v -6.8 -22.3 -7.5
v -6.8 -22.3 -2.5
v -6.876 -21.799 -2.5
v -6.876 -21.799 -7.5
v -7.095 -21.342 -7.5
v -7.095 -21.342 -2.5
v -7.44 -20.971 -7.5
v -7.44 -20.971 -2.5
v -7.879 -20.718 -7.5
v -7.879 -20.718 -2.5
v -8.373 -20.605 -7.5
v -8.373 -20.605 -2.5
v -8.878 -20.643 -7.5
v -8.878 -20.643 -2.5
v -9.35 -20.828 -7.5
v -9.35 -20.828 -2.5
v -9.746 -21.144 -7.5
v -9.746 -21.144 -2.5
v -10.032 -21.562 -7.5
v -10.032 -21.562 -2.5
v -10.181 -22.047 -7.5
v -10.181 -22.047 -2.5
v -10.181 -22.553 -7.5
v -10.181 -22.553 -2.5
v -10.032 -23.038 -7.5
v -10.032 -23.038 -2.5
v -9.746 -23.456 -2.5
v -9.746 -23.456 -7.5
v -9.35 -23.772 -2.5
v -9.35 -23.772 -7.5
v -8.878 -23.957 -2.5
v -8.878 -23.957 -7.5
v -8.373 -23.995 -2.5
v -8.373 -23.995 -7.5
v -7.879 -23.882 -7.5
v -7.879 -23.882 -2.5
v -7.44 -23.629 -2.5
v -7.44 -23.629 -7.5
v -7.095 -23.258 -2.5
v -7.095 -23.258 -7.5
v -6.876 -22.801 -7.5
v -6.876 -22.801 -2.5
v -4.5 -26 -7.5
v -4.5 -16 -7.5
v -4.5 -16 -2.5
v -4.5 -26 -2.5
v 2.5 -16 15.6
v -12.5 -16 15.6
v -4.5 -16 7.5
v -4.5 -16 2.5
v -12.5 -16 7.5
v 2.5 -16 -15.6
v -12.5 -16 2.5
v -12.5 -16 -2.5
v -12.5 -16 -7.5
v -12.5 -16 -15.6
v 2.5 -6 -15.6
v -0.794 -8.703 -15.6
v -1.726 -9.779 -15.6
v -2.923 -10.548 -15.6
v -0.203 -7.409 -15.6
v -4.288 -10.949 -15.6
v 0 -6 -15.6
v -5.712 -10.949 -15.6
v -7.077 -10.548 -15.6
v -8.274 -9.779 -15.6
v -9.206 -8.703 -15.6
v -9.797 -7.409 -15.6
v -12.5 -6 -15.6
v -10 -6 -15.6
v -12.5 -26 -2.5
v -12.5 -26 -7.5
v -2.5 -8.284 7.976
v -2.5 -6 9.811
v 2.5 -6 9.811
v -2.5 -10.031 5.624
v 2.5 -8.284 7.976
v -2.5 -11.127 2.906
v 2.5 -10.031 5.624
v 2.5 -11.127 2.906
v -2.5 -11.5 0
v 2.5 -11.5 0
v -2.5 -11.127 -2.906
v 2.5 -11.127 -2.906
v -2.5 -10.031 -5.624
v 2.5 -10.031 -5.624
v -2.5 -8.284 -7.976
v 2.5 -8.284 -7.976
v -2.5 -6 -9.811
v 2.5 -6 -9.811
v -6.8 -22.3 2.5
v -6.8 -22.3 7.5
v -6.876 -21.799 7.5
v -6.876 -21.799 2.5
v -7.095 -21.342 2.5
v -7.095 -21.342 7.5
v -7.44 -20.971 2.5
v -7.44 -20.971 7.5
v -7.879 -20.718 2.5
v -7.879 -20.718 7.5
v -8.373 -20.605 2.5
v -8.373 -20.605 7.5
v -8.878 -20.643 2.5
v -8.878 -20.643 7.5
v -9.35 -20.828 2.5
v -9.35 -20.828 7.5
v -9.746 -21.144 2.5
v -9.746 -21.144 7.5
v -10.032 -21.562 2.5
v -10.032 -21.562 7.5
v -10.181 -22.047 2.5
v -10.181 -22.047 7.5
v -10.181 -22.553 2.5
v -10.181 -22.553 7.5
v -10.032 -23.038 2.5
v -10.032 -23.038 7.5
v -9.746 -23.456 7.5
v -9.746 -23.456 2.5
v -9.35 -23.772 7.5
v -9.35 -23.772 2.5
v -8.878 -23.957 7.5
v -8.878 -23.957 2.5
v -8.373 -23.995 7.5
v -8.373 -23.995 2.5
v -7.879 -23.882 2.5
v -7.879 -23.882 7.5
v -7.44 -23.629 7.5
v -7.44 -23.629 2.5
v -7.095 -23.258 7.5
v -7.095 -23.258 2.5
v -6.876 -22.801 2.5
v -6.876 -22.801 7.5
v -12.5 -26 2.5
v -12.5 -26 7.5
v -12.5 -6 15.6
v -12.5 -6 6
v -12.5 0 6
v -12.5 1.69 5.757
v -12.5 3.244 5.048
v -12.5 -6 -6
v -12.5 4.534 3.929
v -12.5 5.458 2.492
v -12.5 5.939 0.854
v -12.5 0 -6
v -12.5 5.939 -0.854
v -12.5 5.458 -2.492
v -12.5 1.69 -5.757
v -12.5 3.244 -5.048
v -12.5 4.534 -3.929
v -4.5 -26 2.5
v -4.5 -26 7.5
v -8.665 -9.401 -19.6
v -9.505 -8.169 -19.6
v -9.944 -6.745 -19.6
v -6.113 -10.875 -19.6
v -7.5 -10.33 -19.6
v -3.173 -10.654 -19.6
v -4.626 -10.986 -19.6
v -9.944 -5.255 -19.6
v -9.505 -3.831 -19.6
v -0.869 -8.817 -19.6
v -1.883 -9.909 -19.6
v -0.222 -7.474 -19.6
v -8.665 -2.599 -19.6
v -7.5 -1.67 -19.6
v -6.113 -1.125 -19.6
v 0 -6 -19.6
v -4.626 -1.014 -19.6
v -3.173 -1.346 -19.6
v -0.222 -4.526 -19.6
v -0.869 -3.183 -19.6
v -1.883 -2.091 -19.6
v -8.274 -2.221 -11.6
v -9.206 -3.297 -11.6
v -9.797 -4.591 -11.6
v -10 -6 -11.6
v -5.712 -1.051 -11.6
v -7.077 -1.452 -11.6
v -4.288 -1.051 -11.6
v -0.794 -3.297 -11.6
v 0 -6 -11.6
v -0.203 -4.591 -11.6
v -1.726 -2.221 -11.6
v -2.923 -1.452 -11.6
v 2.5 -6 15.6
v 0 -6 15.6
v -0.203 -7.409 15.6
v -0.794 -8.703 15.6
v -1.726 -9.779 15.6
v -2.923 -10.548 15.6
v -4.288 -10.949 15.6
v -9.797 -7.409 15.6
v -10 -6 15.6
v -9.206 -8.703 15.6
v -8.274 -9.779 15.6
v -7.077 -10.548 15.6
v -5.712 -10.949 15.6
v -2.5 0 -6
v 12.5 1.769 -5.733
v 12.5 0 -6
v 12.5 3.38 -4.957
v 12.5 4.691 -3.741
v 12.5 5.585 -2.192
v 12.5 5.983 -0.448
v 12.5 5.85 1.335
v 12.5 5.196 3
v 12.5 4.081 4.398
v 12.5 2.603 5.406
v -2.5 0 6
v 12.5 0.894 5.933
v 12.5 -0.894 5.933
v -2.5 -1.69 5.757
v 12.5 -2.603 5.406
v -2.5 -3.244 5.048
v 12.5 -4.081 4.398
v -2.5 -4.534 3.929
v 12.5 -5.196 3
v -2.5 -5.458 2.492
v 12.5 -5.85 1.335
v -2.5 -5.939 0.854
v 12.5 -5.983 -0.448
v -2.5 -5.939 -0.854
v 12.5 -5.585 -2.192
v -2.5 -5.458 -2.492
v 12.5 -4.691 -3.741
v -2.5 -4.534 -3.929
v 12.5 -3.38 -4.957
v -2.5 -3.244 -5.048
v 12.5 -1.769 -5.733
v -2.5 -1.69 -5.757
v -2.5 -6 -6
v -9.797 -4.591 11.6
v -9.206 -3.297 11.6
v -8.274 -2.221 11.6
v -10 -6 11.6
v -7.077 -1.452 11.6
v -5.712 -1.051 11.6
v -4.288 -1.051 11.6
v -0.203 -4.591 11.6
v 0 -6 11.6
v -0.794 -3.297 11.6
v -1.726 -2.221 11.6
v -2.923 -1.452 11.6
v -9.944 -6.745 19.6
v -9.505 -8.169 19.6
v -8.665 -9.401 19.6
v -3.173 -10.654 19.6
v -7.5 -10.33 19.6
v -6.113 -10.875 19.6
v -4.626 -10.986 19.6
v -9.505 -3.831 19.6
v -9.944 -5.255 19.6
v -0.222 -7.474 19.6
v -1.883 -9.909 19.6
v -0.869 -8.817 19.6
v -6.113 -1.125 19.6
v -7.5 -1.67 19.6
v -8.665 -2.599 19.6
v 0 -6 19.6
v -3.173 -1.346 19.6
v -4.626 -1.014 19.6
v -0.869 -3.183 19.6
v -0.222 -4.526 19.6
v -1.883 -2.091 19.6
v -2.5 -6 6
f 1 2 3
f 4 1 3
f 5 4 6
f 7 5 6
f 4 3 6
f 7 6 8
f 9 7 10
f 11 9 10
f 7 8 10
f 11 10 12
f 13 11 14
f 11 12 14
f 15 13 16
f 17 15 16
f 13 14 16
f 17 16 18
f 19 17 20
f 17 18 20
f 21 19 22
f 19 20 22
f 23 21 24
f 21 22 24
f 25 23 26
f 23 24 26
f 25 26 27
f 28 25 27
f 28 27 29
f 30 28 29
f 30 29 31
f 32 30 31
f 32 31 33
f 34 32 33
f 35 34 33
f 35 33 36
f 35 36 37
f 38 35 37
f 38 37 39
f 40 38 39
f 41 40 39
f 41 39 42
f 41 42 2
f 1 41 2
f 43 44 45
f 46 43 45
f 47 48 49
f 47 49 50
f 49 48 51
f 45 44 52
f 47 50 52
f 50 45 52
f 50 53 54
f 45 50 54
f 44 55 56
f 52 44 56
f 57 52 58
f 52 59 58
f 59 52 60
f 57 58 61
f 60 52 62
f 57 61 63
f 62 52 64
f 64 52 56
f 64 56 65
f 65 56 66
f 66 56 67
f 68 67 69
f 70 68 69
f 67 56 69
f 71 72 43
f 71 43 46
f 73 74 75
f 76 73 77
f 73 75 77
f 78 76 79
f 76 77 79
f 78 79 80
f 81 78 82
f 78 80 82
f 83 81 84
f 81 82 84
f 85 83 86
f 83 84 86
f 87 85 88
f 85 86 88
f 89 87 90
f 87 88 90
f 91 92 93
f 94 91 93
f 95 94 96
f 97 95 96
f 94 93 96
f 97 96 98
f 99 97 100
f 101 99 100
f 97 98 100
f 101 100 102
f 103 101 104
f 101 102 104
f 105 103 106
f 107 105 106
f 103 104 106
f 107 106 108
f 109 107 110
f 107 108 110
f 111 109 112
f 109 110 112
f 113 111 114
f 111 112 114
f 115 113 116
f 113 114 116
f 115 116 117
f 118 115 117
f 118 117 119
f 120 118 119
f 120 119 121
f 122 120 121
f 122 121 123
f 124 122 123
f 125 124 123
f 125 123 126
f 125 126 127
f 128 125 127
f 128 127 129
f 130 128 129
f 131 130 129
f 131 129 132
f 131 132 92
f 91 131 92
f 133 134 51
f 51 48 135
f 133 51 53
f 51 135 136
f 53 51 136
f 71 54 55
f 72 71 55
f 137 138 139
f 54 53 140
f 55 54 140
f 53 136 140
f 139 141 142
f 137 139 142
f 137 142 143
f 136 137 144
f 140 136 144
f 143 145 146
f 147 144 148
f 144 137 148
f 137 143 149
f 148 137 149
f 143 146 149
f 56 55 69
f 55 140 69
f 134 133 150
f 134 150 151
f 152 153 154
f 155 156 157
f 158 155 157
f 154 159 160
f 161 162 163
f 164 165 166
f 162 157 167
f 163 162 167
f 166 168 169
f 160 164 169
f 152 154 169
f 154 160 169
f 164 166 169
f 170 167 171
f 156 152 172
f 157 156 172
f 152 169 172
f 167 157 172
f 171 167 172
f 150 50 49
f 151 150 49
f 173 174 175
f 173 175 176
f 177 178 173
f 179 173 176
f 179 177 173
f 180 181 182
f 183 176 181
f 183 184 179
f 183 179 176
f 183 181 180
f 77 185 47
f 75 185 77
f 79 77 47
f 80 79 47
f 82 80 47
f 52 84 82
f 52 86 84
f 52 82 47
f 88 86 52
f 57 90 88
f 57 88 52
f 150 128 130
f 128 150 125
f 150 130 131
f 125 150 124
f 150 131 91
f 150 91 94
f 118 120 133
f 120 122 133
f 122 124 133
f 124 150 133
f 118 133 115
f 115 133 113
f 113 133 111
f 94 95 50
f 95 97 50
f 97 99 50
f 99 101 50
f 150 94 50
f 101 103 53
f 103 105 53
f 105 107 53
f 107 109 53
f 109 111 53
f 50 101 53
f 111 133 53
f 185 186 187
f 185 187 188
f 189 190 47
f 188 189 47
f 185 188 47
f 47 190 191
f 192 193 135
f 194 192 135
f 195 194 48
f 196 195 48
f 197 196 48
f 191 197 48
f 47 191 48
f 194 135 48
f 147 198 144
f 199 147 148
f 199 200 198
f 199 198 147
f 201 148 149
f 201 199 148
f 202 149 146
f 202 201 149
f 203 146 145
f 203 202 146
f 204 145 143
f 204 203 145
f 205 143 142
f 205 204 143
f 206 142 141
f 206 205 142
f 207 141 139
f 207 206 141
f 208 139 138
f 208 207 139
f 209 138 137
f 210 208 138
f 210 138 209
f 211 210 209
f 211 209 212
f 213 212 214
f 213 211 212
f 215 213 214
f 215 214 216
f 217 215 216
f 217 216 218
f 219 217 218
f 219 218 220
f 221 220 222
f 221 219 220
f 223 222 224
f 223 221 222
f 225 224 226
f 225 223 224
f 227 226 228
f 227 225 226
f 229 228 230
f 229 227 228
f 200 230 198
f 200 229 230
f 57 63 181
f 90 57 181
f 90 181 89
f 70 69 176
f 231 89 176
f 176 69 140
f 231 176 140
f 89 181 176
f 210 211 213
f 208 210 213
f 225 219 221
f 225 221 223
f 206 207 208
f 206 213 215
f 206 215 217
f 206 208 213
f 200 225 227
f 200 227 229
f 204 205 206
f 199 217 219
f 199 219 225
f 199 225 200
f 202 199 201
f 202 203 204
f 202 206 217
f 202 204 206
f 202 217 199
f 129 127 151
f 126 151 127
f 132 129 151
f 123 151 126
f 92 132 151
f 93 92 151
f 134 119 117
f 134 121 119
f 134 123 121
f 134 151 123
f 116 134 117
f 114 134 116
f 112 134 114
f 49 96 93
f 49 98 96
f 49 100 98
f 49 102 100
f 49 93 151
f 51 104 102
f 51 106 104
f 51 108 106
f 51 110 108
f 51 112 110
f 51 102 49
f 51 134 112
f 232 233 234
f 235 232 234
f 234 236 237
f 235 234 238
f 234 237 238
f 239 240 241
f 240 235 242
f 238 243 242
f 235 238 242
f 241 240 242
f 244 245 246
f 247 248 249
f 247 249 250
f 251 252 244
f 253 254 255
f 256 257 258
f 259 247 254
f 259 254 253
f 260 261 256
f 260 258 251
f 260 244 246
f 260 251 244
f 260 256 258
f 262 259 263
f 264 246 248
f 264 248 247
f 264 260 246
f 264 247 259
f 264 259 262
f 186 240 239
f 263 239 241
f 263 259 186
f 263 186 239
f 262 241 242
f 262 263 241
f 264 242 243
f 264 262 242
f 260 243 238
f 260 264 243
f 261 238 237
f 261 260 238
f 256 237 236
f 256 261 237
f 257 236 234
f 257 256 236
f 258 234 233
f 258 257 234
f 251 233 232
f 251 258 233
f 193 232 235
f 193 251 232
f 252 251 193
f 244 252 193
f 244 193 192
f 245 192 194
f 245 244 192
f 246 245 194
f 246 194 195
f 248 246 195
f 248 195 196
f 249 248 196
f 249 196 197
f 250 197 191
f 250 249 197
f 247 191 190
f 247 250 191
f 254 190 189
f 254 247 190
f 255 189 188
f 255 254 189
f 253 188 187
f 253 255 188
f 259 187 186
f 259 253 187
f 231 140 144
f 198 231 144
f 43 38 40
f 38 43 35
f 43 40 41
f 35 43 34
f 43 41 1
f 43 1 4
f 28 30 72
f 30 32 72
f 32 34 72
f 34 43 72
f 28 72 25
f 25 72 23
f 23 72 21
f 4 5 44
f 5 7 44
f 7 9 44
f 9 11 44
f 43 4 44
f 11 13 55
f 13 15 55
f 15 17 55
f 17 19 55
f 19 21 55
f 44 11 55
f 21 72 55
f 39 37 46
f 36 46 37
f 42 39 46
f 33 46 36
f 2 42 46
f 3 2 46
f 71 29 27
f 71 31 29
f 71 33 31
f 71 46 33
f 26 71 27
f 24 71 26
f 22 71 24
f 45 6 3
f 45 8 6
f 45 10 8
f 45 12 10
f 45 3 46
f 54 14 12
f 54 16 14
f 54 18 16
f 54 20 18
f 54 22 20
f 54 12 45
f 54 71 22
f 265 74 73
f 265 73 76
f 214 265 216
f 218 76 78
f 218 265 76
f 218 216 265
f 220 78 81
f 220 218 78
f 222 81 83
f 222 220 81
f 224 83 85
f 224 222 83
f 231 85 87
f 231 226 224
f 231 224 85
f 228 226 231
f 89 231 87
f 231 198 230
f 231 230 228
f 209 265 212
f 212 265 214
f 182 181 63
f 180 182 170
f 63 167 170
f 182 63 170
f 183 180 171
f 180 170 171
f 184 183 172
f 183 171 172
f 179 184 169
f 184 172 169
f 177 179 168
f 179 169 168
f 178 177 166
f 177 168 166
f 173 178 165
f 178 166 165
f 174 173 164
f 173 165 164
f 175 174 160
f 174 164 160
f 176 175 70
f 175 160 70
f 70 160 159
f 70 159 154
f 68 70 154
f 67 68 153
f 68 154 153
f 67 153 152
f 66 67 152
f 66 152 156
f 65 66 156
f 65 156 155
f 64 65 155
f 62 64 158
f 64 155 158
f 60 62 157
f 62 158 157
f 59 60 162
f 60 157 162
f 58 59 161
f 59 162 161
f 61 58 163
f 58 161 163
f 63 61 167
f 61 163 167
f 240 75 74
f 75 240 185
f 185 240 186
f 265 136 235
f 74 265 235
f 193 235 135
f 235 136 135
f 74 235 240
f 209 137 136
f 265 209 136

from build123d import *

# Parameters (mm, degrees)
CROQUIS2_R              = 6
SALIENTE_EXTRUIR1_DEPTH = 12.5
SALIENTE_EXTRUIR2_DEPTH = 15
CROQUIS5_R              = 11.5
CROQUIS5_R_2            = 6
CORTAR_EXTRUIR2_DEPTH   = 5
CROQUIS6_W              = 5
CROQUIS6_H              = 10
SALIENTE_EXTRUIR3_DEPTH = 8
CROQUIS7_R              = 1.7
CORTAR_EXTRUIR3_DEPTH   = 15
CROQUIS8_R              = 5
SALIENTE_EXTRUIR4_DEPTH = 4


with BuildPart() as part:
    # Croquis2 → Saliente-Extruir1 (new body, symmetric)
    with BuildSketch(Plane(origin=(0, 0, 0), x_dir=(0, 0, -1), z_dir=(1, 0, 0))):
        Circle(CROQUIS2_R)
    extrude(amount=SALIENTE_EXTRUIR1_DEPTH, both=True)

    # Croquis3 → Saliente-Extruir2 (add)
    with BuildSketch(Plane.ZY.offset(12.5)):
        Polygon((-15.6, -6), (-6, -6), (-6, 0), (6, 0), (6, -6), (15.6, -6), (15.6, -16), (-15.6, -16), align=None)
    extrude(amount=-SALIENTE_EXTRUIR2_DEPTH)

    # Croquis5 → Cortar-Extruir2 (cut)
    with BuildSketch(Plane(origin=(2.5, 0, 0), x_dir=(0, 0, -1), z_dir=(1, 0, 0))):
        Circle(CROQUIS5_R)
        Circle(CROQUIS5_R_2, mode=Mode.SUBTRACT)
    extrude(amount=-CORTAR_EXTRUIR2_DEPTH, mode=Mode.SUBTRACT)

    # Croquis6 → Saliente-Extruir3 (add)
    with BuildSketch(Plane.ZY.offset(12.5)):
        with Locations((5, -21)):
            Rectangle(CROQUIS6_W, CROQUIS6_H)
        with Locations((-5, -21)):
            Rectangle(CROQUIS6_W, CROQUIS6_H)
    extrude(amount=-SALIENTE_EXTRUIR3_DEPTH)

    # Croquis7 → Cortar-Extruir3 (cut)
    with BuildSketch(Plane.XY.offset(7.5)):
        with Locations((-8.5, -22.3)):
            Circle(CROQUIS7_R)
    extrude(amount=-CORTAR_EXTRUIR3_DEPTH, mode=Mode.SUBTRACT)

    # Croquis8 → Saliente-Extruir4 (add, symmetric)
    with BuildSketch(Plane.XY.offset(15.6)):
        with Locations((-5, -6)):
            Circle(CROQUIS8_R)
    saliente_extruir4 = extrude(amount=SALIENTE_EXTRUIR4_DEPTH, both=True)

    # Simetría1: Saliente-Extruir4 across plane
    add(saliente_extruir4.mirror(Plane.XY))


solid = part.part
